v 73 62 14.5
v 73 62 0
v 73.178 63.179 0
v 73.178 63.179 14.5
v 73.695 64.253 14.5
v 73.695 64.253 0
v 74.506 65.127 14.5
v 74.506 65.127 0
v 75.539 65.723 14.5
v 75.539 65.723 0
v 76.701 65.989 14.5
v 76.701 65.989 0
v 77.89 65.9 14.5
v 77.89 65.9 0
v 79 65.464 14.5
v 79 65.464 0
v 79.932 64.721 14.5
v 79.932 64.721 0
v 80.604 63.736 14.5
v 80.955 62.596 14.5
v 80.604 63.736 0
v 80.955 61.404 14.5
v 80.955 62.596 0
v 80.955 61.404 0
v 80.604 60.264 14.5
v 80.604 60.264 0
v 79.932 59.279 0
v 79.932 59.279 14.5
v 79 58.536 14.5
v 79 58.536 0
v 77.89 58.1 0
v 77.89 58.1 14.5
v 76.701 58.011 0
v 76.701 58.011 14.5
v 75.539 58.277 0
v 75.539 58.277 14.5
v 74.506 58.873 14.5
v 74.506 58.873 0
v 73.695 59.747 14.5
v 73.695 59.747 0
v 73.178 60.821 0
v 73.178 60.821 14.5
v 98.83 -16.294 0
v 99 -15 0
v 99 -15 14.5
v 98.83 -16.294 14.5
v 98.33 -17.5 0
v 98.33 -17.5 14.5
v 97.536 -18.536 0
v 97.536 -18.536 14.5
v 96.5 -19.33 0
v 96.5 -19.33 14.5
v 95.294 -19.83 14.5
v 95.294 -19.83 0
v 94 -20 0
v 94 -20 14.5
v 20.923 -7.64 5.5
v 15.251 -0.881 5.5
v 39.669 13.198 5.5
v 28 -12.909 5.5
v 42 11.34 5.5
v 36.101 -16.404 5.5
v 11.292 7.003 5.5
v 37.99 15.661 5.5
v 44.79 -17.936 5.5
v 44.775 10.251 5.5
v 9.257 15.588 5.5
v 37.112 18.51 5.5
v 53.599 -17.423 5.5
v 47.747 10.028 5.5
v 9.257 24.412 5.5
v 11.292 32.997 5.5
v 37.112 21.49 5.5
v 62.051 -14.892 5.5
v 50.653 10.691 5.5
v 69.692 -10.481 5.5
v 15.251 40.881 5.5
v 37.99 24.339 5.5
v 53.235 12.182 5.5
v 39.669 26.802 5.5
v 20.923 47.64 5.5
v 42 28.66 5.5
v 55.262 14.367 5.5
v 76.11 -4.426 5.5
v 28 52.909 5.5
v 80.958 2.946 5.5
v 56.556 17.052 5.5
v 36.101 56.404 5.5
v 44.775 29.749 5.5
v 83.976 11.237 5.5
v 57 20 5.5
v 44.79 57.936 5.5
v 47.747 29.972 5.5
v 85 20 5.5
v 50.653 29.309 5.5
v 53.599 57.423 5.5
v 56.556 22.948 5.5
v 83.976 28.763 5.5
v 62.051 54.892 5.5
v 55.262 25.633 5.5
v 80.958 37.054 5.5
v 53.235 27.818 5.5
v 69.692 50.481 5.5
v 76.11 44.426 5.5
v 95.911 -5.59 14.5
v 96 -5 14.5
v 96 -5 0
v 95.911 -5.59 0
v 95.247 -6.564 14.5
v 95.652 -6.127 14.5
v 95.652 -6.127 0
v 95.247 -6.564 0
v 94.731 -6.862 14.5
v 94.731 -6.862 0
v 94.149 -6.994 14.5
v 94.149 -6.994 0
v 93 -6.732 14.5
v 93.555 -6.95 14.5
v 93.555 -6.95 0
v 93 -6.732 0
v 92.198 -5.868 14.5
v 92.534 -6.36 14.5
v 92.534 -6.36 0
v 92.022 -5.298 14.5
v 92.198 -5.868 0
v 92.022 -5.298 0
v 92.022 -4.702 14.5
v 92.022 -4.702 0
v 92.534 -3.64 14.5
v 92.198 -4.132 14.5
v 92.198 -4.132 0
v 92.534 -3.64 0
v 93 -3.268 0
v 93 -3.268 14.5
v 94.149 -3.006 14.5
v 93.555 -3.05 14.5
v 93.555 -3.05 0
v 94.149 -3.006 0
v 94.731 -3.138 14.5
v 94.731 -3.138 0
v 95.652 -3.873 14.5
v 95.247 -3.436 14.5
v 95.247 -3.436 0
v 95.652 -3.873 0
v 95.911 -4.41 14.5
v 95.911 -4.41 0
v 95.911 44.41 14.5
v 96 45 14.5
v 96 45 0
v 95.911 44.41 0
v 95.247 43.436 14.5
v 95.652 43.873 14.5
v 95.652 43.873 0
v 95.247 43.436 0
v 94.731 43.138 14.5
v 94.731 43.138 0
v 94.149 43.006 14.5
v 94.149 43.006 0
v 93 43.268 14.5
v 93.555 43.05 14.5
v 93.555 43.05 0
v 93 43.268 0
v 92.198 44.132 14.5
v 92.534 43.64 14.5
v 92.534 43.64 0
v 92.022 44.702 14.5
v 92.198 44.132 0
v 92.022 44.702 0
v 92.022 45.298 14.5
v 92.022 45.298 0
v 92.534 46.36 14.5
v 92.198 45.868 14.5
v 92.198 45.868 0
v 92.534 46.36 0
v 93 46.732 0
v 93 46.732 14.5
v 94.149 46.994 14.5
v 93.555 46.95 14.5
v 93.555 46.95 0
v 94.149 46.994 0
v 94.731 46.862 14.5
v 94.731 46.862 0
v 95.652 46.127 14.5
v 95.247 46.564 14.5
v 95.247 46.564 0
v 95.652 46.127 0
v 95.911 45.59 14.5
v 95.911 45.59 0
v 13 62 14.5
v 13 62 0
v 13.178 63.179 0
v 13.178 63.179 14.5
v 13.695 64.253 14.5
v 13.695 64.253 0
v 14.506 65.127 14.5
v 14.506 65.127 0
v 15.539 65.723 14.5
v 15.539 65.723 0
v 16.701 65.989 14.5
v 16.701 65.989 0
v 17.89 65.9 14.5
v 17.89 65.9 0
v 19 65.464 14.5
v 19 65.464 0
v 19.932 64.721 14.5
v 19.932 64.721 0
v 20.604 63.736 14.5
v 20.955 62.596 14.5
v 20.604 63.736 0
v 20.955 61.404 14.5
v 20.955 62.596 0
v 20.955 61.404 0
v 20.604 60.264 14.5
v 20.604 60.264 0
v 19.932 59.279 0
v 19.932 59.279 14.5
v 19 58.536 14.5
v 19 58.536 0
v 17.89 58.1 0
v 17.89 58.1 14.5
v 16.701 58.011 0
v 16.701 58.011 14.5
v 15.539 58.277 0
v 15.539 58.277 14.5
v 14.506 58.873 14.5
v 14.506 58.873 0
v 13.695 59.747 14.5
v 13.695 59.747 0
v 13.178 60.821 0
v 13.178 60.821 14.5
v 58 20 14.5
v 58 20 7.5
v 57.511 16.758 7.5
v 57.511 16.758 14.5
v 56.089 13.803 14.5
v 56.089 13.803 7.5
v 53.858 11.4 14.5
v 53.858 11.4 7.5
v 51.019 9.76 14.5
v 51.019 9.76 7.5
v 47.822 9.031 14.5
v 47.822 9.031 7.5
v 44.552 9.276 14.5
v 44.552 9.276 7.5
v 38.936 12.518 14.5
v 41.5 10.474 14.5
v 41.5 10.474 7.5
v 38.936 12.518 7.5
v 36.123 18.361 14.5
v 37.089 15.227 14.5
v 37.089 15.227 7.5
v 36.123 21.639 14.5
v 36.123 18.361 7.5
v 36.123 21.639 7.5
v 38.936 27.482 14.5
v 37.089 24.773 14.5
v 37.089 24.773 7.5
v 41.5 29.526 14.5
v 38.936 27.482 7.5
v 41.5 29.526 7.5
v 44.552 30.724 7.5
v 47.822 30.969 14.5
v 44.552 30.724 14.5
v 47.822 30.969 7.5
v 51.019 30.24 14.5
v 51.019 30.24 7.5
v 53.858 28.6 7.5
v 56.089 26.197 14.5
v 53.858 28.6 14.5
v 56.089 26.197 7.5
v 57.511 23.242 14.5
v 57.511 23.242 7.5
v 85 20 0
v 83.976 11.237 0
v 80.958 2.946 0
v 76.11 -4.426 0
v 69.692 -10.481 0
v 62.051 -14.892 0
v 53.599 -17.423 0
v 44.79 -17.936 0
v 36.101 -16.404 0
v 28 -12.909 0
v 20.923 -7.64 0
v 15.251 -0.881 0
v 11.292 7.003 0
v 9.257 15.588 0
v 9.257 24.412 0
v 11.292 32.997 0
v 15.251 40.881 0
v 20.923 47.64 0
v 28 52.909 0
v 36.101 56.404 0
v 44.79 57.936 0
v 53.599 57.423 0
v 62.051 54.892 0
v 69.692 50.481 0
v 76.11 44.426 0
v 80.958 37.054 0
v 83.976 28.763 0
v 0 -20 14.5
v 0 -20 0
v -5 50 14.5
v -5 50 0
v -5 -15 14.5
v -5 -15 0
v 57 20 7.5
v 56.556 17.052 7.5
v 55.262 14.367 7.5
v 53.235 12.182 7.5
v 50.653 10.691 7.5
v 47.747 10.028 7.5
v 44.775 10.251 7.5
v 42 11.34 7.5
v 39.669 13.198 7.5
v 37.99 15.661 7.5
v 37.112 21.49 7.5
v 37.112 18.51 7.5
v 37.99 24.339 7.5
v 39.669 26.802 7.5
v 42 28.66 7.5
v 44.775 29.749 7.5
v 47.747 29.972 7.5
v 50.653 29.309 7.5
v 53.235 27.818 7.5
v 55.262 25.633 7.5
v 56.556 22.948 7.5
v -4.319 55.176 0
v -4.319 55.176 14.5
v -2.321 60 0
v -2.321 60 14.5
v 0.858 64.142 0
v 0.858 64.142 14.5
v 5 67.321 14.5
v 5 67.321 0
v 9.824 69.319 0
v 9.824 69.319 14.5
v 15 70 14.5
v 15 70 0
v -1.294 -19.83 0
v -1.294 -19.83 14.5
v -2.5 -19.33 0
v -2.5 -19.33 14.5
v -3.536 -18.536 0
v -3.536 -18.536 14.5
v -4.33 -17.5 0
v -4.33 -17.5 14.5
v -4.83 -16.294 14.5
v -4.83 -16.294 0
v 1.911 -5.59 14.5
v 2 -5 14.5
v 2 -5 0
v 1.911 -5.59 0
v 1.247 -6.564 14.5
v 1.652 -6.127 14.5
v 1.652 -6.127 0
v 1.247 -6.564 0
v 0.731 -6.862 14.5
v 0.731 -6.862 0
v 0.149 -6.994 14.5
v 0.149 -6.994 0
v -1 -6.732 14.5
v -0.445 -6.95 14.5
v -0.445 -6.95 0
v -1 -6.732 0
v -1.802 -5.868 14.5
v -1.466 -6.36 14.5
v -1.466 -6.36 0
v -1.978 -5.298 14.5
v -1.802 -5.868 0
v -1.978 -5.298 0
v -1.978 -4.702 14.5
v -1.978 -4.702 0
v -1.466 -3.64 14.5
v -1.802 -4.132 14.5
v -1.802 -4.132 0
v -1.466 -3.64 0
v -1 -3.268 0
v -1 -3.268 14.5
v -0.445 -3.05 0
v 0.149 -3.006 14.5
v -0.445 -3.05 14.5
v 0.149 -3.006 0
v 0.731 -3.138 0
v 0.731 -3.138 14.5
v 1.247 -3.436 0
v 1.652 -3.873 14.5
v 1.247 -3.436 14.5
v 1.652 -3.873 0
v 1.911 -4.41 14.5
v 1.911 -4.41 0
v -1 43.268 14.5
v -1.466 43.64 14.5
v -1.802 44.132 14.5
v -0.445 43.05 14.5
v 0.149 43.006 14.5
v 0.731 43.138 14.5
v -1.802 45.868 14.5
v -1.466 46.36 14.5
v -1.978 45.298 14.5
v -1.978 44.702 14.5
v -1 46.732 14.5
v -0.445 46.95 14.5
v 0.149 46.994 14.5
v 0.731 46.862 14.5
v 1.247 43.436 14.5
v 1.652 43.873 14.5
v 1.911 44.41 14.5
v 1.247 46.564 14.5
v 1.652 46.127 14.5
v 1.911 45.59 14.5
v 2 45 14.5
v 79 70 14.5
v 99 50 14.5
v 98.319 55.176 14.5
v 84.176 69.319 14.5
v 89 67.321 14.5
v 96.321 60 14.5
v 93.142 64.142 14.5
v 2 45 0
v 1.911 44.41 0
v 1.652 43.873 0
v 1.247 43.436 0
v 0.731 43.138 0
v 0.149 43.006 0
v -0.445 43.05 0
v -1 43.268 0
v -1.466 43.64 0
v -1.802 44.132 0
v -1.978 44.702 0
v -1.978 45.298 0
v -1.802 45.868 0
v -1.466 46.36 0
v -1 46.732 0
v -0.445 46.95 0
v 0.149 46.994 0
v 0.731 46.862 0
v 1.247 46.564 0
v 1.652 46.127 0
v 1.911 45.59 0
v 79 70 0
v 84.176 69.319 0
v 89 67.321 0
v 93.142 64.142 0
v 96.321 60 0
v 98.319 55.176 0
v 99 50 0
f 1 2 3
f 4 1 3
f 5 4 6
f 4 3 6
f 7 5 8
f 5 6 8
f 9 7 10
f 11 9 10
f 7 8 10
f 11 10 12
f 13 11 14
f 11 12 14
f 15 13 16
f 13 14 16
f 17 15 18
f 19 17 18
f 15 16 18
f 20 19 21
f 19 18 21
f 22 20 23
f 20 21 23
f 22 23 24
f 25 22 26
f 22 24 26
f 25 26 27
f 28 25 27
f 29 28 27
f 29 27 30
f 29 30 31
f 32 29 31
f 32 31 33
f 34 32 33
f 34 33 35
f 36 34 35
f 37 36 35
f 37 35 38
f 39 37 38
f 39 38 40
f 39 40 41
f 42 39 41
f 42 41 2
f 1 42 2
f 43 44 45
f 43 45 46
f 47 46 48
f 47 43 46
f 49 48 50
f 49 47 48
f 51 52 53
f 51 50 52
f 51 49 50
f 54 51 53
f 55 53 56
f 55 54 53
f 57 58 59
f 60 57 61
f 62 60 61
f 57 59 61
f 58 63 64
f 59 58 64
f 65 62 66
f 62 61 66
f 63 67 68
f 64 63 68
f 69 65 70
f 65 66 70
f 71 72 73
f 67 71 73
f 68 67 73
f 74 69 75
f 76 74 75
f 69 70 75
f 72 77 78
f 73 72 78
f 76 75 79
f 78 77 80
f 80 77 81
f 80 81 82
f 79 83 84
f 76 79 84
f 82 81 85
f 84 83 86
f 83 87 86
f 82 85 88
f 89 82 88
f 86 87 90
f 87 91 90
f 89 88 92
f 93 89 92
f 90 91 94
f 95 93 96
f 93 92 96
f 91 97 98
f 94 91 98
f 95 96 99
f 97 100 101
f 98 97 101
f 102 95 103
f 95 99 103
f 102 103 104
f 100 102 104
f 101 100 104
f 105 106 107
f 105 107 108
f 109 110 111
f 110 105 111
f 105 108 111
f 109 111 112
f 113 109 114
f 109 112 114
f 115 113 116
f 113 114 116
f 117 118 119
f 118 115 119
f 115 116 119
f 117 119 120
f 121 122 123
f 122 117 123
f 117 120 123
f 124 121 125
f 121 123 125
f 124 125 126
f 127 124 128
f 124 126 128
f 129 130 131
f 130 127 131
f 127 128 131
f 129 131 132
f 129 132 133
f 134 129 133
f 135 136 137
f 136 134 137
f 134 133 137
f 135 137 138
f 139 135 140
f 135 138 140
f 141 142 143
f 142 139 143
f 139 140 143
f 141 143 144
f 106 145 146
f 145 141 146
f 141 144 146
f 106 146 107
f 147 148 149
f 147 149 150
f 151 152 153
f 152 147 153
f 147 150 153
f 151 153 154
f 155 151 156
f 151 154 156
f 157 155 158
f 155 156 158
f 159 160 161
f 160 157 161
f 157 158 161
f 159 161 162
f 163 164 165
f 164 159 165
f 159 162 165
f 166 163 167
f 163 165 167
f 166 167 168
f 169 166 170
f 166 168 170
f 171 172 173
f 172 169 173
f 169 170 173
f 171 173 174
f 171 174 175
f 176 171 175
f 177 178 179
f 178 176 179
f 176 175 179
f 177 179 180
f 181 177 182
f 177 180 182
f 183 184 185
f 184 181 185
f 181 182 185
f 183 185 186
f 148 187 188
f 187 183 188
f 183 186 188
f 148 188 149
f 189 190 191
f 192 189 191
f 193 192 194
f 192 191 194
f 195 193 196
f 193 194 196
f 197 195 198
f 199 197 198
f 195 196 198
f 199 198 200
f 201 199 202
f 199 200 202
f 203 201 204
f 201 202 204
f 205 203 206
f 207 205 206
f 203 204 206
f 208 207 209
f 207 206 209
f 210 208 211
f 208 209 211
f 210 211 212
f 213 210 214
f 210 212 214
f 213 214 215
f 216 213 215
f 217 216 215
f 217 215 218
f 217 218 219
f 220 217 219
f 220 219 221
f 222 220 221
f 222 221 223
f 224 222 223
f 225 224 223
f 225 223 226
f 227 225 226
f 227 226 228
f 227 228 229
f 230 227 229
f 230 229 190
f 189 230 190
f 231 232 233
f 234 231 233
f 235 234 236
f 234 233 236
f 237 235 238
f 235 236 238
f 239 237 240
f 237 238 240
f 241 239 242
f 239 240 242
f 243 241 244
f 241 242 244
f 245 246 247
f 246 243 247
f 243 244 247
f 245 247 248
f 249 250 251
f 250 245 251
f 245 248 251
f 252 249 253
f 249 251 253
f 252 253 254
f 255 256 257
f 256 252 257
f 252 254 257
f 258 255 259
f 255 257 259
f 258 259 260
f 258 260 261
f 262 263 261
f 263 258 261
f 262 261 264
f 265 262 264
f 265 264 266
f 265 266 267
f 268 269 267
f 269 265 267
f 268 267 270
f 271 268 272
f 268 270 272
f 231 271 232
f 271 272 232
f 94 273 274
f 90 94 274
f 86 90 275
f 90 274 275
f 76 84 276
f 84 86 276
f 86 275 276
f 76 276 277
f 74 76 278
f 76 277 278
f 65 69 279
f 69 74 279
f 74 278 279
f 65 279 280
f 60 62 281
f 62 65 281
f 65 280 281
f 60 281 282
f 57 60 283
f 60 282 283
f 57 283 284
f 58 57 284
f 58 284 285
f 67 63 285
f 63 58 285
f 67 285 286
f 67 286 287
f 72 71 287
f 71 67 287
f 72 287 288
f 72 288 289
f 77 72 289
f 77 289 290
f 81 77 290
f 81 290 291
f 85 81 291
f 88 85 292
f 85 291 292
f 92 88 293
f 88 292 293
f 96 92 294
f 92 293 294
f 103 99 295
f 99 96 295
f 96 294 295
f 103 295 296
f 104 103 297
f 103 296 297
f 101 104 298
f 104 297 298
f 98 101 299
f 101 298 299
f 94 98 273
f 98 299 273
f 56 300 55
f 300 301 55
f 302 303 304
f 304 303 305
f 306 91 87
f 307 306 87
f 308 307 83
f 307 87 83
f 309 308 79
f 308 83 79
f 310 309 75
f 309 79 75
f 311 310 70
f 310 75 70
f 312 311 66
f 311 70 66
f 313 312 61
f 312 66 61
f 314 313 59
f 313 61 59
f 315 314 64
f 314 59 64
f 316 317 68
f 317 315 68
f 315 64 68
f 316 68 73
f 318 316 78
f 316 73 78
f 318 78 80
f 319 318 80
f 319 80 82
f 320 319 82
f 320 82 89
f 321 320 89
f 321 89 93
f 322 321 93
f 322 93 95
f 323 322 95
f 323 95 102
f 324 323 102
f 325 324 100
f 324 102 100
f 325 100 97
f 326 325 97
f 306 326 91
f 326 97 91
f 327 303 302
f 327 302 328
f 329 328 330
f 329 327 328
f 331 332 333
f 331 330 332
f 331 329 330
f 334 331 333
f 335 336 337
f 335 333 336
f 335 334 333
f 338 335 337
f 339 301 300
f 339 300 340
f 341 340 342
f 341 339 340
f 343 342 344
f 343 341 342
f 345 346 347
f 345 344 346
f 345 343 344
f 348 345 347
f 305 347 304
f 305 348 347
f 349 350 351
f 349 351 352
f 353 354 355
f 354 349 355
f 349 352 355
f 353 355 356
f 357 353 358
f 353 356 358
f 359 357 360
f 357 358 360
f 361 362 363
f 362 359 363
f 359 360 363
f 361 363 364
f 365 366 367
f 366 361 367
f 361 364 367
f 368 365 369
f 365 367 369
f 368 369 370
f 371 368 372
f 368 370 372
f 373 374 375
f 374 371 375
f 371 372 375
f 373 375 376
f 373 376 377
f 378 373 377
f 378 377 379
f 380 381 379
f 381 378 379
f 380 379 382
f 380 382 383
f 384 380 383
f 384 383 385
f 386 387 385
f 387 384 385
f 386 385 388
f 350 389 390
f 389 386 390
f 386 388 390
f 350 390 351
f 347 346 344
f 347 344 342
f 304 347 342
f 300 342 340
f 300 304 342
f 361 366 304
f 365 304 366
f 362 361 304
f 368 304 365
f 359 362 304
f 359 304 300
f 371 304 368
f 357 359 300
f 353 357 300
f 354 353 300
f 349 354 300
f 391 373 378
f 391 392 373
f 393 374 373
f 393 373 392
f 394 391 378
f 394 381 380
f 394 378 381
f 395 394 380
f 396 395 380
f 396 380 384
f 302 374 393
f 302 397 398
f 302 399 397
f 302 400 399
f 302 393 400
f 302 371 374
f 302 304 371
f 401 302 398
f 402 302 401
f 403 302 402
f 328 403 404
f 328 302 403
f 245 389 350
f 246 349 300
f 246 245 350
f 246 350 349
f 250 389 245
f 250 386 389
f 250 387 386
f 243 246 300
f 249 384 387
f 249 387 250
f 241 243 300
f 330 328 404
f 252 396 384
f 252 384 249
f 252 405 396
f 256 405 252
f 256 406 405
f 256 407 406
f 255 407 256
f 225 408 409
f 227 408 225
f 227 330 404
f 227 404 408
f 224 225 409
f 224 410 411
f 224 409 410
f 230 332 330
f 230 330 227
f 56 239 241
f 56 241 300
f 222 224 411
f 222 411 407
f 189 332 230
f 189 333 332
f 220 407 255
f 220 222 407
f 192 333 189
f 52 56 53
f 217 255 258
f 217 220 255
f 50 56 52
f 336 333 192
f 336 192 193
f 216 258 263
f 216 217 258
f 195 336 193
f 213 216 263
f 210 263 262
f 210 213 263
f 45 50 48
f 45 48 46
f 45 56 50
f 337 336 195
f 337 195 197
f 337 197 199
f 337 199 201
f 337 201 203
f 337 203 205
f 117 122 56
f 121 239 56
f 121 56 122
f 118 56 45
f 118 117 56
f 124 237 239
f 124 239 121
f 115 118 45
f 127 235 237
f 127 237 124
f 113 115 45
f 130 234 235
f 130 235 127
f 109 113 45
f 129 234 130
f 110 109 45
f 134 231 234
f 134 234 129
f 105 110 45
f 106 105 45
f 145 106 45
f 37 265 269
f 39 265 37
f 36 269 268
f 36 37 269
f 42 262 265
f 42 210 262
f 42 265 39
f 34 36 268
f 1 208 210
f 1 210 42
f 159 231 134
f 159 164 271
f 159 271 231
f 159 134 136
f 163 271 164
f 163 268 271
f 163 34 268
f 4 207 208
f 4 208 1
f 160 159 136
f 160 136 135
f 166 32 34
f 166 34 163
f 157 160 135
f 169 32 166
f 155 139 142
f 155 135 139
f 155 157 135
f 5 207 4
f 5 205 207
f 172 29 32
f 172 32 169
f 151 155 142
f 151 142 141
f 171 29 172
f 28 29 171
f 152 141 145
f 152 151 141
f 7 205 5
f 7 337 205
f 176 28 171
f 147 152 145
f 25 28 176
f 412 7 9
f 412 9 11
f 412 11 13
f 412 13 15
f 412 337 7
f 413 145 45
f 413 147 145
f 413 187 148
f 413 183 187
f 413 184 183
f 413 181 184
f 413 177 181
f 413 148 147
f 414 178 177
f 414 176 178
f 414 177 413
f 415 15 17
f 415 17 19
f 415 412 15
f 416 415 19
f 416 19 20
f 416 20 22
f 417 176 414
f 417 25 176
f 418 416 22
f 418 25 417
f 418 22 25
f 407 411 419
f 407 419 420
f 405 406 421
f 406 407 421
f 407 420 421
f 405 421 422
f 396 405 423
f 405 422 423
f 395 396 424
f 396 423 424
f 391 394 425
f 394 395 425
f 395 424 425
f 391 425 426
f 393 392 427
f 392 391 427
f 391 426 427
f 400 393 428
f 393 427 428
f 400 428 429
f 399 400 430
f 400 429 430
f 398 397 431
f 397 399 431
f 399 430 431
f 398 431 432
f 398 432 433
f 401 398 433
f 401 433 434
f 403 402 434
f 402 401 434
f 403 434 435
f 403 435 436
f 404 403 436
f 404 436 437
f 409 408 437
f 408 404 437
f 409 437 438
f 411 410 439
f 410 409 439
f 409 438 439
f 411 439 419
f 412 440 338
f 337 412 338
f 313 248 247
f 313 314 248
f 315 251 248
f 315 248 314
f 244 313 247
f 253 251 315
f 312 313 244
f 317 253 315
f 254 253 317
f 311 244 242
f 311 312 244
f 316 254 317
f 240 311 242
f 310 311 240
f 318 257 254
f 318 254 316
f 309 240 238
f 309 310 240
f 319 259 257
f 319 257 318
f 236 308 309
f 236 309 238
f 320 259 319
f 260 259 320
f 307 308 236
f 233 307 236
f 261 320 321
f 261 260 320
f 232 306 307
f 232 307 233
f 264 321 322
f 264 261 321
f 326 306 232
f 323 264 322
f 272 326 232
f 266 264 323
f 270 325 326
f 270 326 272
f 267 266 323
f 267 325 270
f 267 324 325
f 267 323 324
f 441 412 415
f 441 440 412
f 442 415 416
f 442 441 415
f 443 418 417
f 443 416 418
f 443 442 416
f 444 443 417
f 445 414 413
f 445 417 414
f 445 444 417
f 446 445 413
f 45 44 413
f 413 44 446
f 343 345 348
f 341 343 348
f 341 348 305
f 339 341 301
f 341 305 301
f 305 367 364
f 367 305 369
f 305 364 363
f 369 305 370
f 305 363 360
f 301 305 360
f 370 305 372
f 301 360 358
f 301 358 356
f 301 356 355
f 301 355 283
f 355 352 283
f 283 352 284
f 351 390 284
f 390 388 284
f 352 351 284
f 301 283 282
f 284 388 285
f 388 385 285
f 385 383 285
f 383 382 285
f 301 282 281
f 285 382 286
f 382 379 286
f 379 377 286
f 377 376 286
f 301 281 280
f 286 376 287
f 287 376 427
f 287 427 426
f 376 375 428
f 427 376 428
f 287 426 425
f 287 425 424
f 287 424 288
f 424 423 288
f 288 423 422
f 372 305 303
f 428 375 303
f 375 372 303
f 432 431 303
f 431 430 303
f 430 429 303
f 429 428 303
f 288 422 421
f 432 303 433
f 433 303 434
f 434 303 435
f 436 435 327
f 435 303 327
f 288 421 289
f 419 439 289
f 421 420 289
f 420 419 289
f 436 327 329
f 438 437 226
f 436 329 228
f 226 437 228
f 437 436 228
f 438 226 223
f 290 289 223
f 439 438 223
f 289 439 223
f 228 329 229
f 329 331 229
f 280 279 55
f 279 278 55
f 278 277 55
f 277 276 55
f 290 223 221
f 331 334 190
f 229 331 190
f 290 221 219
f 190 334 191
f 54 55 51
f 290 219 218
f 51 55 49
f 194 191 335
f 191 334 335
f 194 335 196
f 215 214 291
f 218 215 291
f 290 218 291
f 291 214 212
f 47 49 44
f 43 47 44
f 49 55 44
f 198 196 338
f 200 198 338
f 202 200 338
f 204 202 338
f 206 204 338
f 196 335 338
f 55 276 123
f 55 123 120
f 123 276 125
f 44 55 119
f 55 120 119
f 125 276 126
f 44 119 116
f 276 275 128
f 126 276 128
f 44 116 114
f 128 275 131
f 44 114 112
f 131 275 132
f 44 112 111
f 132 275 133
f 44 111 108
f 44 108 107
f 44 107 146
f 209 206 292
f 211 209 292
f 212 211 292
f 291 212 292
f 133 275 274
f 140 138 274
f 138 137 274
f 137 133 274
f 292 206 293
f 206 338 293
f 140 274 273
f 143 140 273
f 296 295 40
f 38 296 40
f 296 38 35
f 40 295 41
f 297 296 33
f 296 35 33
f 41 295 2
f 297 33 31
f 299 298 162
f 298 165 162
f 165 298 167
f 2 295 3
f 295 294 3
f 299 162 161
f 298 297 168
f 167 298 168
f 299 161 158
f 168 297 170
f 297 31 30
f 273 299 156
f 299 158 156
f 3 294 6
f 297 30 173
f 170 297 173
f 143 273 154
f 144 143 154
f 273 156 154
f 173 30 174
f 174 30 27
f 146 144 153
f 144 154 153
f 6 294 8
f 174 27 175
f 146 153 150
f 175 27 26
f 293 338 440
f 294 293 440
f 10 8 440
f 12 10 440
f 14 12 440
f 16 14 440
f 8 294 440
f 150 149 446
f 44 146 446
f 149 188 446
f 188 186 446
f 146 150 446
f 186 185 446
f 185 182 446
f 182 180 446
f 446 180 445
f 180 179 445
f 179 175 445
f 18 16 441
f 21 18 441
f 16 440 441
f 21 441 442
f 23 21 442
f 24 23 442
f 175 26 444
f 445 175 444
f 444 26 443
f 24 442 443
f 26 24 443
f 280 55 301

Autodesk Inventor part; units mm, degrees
ref_plane "YZ Plane" through (0, 0, 0) normal (1, 0, 0) x (0, 1, 0)
ref_plane "XZ Plane" through (0, 0, 0) normal (0, 1, 0) x (-1, 0, 0)
ref_plane "XY Plane" through (0, 0, 0) normal (0, 0, 1) x (1, 0, 0)
ref_plane "Work Plane1" through (0, 0, 0) normal (0, 0, 1) x (1, 0, 0)
sketch "Sketch1" plane through (0, 0, 0) normal (0, 0, 1) x (1, 0, 0)
  circle A0 centre (0, -5) radius 2 projected
  circle A1 centre (94, 45) radius 2 projected
  circle A2 centre (94, -5) radius 2 projected
  circle A3 centre (0, 45) radius 2 projected
  line L0 (5, -10) -> (5, 20) projected
  arc A4 (89, 20) -> (5, 20) centre (47, 20) ccw projected
  line L1 (89, 20) -> (89, -10) projected
  line L2 (99, -15) -> (99, 50) projected
  line L3 (79, 70) -> (15, 70) projected
  line L4 (-5, 50) -> (-5, -15) projected
  circle A5 centre (47, 20) radius 38
  circle A6 centre (77, 62) radius 4 projected
  circle A7 centre (17, 62) radius 4 projected
  line L5 (89, -10) -> (81, -10) projected
  line L6 (81, -20) -> (81, -10) projected
  line L7 (81, -20) -> (94, -20) projected
  line L8 (0, -20) -> (13, -20) projected
  line L9 (13, -20) -> (13, -10) projected
  line L10 (5, -10) -> (13, -10) projected
  line L11 (13, -20) -> (81, -20)
  arc A8 (94, -20) -> (99, -15) centre (94, -15) ccw projected
  arc A9 (99, 50) -> (79, 70) centre (79, 50) ccw projected
  arc A10 (15, 70) -> (-5, 50) centre (15, 50) ccw projected
  arc A11 (-5, -15) -> (0, -20) centre (0, -15) ccw projected
  point P0 (0, 0)
  dimension "d0" = 76
extrude "Extrusion1" add sketch "Sketch1" along normal blind 5.5 contours L10 L9 L8 A11 L4 A10 L3 A9 L2 A8 L7 L6 L5 L1 A4 L0 | L0 A4 L1 L5 L6 L11 L9 L10 | A6 | A7
sketch "Sketch2" plane through (0, 0, 5.5) normal (0, 0, 1) x (1, 0, 0)
  circle A0 centre (47, 20) radius 38 projected
  circle A1 centre (0, 45) radius 2 projected
  circle A2 centre (94, -5) radius 2 projected
  circle A3 centre (94, 45) radius 2 projected
  circle A4 centre (0, -5) radius 2 projected
  line L0 (99, -15) -> (99, 50) projected
  line L1 (79, 70) -> (15, 70) projected
  line L2 (-5, 50) -> (-5, -15) projected
  circle A5 centre (47, 20) radius 10
  line L3 (0, -20) -> (94, -20) projected
  arc A6 (94, -20) -> (99, -15) centre (94, -15) ccw projected
  arc A7 (99, 50) -> (79, 70) centre (79, 50) ccw projected
  arc A8 (15, 70) -> (-5, 50) centre (15, 50) ccw projected
  arc A9 (-5, -15) -> (0, -20) centre (0, -15) ccw projected
  point P0 (0, 0)
  dimension "d3" = 20
extrude "Extrusion2" add sketch "Sketch2" along normal blind 2 contours A0 | A6 L3 A9 L2 A8 L1 A7 L0
sketch "Sketch3" plane through (0, 0, 7.5) normal (0, 0, 1) x (1, 0, 0)
  circle A0 centre (47, 20) radius 10 projected
  circle A1 centre (0, -5) radius 2 projected
  circle A2 centre (94, 45) radius 2 projected
  circle A3 centre (94, -5) radius 2 projected
  circle A4 centre (0, 45) radius 2 projected
  line L0 (99, -15) -> (99, 50) projected
  line L1 (79, 70) -> (15, 70) projected
  line L2 (-5, 50) -> (-5, -15) projected
  circle A5 centre (47, 20) radius 11
  line L3 (0, -20) -> (94, -20) projected
  arc A6 (94, -20) -> (99, -15) centre (94, -15) ccw projected
  arc A7 (99, 50) -> (79, 70) centre (79, 50) ccw projected
  arc A8 (15, 70) -> (-5, 50) centre (15, 50) ccw projected
  arc A9 (-5, -15) -> (0, -20) centre (0, -15) ccw projected
  point P0 (0, 0)
  dimension "d6" = 22
extrude "Extrusion3" add sketch "Sketch3" along normal blind 7 contours A6 L3 A9 L2 A8 L1 A7 L0
sketch "Sketch4" plane through (0, 0, 0) normal (0, 0, -1) x (-1, 0, 0)
  circle A0 centre (0, -5) radius 2 construction
  circle A1 centre (-94, 45) radius 2 construction
  circle A2 centre (-94, -5) radius 2 construction
  circle A3 centre (0, 45) radius 2 construction
  line L0 (-85, -10) -> (-85, 20) construction
  arc A4 (-9, 20) -> (-85, 20) centre (-47, 20) ccw construction
  line L1 (-9, 20) -> (-9, -10) construction
  line L2 (5, -15) -> (5, 50) construction
  line L3 (-15, 70) -> (-79, 70) construction
  line L4 (-99, 50) -> (-99, -15) construction
  line L5 (-77, 62) -> (-17, 62) construction
  circle A5 centre (-77, 62) radius 4
  circle A6 centre (-17, 62) radius 4
  circle A7 centre (-77, 62) radius 4 projected
  circle A8 centre (-17, 62) radius 4 projected
  line L6 (-94, -20) -> (-81, -20) projected
  line L7 (-81, -20) -> (-81, -10) projected
  line L8 (-81, -10) -> (-85, -10) projected
  line L9 (-13, -10) -> (-9, -10) projected
  line L10 (-13, -20) -> (-13, -10) projected
  line L11 (0, -20) -> (-13, -20) projected
  arc A9 (-99, -15) -> (-94, -20) centre (-94, -15) ccw projected
  arc A10 (0, -20) -> (5, -15) centre (0, -15) ccw projected
  arc A11 (5, 50) -> (-15, 70) centre (-15, 50) ccw projected
  arc A12 (-79, 70) -> (-99, 50) centre (-79, 50) ccw projected
  point P0 (0, 0)
  point P1 (-47, 62)
  dimension "d9" = 8
  dimension "d10" = 8
  dimension "d11" = 60
extrude "Extrusion4" cut sketch "Sketch4" against normal through all
properties part number "frame bottom"
